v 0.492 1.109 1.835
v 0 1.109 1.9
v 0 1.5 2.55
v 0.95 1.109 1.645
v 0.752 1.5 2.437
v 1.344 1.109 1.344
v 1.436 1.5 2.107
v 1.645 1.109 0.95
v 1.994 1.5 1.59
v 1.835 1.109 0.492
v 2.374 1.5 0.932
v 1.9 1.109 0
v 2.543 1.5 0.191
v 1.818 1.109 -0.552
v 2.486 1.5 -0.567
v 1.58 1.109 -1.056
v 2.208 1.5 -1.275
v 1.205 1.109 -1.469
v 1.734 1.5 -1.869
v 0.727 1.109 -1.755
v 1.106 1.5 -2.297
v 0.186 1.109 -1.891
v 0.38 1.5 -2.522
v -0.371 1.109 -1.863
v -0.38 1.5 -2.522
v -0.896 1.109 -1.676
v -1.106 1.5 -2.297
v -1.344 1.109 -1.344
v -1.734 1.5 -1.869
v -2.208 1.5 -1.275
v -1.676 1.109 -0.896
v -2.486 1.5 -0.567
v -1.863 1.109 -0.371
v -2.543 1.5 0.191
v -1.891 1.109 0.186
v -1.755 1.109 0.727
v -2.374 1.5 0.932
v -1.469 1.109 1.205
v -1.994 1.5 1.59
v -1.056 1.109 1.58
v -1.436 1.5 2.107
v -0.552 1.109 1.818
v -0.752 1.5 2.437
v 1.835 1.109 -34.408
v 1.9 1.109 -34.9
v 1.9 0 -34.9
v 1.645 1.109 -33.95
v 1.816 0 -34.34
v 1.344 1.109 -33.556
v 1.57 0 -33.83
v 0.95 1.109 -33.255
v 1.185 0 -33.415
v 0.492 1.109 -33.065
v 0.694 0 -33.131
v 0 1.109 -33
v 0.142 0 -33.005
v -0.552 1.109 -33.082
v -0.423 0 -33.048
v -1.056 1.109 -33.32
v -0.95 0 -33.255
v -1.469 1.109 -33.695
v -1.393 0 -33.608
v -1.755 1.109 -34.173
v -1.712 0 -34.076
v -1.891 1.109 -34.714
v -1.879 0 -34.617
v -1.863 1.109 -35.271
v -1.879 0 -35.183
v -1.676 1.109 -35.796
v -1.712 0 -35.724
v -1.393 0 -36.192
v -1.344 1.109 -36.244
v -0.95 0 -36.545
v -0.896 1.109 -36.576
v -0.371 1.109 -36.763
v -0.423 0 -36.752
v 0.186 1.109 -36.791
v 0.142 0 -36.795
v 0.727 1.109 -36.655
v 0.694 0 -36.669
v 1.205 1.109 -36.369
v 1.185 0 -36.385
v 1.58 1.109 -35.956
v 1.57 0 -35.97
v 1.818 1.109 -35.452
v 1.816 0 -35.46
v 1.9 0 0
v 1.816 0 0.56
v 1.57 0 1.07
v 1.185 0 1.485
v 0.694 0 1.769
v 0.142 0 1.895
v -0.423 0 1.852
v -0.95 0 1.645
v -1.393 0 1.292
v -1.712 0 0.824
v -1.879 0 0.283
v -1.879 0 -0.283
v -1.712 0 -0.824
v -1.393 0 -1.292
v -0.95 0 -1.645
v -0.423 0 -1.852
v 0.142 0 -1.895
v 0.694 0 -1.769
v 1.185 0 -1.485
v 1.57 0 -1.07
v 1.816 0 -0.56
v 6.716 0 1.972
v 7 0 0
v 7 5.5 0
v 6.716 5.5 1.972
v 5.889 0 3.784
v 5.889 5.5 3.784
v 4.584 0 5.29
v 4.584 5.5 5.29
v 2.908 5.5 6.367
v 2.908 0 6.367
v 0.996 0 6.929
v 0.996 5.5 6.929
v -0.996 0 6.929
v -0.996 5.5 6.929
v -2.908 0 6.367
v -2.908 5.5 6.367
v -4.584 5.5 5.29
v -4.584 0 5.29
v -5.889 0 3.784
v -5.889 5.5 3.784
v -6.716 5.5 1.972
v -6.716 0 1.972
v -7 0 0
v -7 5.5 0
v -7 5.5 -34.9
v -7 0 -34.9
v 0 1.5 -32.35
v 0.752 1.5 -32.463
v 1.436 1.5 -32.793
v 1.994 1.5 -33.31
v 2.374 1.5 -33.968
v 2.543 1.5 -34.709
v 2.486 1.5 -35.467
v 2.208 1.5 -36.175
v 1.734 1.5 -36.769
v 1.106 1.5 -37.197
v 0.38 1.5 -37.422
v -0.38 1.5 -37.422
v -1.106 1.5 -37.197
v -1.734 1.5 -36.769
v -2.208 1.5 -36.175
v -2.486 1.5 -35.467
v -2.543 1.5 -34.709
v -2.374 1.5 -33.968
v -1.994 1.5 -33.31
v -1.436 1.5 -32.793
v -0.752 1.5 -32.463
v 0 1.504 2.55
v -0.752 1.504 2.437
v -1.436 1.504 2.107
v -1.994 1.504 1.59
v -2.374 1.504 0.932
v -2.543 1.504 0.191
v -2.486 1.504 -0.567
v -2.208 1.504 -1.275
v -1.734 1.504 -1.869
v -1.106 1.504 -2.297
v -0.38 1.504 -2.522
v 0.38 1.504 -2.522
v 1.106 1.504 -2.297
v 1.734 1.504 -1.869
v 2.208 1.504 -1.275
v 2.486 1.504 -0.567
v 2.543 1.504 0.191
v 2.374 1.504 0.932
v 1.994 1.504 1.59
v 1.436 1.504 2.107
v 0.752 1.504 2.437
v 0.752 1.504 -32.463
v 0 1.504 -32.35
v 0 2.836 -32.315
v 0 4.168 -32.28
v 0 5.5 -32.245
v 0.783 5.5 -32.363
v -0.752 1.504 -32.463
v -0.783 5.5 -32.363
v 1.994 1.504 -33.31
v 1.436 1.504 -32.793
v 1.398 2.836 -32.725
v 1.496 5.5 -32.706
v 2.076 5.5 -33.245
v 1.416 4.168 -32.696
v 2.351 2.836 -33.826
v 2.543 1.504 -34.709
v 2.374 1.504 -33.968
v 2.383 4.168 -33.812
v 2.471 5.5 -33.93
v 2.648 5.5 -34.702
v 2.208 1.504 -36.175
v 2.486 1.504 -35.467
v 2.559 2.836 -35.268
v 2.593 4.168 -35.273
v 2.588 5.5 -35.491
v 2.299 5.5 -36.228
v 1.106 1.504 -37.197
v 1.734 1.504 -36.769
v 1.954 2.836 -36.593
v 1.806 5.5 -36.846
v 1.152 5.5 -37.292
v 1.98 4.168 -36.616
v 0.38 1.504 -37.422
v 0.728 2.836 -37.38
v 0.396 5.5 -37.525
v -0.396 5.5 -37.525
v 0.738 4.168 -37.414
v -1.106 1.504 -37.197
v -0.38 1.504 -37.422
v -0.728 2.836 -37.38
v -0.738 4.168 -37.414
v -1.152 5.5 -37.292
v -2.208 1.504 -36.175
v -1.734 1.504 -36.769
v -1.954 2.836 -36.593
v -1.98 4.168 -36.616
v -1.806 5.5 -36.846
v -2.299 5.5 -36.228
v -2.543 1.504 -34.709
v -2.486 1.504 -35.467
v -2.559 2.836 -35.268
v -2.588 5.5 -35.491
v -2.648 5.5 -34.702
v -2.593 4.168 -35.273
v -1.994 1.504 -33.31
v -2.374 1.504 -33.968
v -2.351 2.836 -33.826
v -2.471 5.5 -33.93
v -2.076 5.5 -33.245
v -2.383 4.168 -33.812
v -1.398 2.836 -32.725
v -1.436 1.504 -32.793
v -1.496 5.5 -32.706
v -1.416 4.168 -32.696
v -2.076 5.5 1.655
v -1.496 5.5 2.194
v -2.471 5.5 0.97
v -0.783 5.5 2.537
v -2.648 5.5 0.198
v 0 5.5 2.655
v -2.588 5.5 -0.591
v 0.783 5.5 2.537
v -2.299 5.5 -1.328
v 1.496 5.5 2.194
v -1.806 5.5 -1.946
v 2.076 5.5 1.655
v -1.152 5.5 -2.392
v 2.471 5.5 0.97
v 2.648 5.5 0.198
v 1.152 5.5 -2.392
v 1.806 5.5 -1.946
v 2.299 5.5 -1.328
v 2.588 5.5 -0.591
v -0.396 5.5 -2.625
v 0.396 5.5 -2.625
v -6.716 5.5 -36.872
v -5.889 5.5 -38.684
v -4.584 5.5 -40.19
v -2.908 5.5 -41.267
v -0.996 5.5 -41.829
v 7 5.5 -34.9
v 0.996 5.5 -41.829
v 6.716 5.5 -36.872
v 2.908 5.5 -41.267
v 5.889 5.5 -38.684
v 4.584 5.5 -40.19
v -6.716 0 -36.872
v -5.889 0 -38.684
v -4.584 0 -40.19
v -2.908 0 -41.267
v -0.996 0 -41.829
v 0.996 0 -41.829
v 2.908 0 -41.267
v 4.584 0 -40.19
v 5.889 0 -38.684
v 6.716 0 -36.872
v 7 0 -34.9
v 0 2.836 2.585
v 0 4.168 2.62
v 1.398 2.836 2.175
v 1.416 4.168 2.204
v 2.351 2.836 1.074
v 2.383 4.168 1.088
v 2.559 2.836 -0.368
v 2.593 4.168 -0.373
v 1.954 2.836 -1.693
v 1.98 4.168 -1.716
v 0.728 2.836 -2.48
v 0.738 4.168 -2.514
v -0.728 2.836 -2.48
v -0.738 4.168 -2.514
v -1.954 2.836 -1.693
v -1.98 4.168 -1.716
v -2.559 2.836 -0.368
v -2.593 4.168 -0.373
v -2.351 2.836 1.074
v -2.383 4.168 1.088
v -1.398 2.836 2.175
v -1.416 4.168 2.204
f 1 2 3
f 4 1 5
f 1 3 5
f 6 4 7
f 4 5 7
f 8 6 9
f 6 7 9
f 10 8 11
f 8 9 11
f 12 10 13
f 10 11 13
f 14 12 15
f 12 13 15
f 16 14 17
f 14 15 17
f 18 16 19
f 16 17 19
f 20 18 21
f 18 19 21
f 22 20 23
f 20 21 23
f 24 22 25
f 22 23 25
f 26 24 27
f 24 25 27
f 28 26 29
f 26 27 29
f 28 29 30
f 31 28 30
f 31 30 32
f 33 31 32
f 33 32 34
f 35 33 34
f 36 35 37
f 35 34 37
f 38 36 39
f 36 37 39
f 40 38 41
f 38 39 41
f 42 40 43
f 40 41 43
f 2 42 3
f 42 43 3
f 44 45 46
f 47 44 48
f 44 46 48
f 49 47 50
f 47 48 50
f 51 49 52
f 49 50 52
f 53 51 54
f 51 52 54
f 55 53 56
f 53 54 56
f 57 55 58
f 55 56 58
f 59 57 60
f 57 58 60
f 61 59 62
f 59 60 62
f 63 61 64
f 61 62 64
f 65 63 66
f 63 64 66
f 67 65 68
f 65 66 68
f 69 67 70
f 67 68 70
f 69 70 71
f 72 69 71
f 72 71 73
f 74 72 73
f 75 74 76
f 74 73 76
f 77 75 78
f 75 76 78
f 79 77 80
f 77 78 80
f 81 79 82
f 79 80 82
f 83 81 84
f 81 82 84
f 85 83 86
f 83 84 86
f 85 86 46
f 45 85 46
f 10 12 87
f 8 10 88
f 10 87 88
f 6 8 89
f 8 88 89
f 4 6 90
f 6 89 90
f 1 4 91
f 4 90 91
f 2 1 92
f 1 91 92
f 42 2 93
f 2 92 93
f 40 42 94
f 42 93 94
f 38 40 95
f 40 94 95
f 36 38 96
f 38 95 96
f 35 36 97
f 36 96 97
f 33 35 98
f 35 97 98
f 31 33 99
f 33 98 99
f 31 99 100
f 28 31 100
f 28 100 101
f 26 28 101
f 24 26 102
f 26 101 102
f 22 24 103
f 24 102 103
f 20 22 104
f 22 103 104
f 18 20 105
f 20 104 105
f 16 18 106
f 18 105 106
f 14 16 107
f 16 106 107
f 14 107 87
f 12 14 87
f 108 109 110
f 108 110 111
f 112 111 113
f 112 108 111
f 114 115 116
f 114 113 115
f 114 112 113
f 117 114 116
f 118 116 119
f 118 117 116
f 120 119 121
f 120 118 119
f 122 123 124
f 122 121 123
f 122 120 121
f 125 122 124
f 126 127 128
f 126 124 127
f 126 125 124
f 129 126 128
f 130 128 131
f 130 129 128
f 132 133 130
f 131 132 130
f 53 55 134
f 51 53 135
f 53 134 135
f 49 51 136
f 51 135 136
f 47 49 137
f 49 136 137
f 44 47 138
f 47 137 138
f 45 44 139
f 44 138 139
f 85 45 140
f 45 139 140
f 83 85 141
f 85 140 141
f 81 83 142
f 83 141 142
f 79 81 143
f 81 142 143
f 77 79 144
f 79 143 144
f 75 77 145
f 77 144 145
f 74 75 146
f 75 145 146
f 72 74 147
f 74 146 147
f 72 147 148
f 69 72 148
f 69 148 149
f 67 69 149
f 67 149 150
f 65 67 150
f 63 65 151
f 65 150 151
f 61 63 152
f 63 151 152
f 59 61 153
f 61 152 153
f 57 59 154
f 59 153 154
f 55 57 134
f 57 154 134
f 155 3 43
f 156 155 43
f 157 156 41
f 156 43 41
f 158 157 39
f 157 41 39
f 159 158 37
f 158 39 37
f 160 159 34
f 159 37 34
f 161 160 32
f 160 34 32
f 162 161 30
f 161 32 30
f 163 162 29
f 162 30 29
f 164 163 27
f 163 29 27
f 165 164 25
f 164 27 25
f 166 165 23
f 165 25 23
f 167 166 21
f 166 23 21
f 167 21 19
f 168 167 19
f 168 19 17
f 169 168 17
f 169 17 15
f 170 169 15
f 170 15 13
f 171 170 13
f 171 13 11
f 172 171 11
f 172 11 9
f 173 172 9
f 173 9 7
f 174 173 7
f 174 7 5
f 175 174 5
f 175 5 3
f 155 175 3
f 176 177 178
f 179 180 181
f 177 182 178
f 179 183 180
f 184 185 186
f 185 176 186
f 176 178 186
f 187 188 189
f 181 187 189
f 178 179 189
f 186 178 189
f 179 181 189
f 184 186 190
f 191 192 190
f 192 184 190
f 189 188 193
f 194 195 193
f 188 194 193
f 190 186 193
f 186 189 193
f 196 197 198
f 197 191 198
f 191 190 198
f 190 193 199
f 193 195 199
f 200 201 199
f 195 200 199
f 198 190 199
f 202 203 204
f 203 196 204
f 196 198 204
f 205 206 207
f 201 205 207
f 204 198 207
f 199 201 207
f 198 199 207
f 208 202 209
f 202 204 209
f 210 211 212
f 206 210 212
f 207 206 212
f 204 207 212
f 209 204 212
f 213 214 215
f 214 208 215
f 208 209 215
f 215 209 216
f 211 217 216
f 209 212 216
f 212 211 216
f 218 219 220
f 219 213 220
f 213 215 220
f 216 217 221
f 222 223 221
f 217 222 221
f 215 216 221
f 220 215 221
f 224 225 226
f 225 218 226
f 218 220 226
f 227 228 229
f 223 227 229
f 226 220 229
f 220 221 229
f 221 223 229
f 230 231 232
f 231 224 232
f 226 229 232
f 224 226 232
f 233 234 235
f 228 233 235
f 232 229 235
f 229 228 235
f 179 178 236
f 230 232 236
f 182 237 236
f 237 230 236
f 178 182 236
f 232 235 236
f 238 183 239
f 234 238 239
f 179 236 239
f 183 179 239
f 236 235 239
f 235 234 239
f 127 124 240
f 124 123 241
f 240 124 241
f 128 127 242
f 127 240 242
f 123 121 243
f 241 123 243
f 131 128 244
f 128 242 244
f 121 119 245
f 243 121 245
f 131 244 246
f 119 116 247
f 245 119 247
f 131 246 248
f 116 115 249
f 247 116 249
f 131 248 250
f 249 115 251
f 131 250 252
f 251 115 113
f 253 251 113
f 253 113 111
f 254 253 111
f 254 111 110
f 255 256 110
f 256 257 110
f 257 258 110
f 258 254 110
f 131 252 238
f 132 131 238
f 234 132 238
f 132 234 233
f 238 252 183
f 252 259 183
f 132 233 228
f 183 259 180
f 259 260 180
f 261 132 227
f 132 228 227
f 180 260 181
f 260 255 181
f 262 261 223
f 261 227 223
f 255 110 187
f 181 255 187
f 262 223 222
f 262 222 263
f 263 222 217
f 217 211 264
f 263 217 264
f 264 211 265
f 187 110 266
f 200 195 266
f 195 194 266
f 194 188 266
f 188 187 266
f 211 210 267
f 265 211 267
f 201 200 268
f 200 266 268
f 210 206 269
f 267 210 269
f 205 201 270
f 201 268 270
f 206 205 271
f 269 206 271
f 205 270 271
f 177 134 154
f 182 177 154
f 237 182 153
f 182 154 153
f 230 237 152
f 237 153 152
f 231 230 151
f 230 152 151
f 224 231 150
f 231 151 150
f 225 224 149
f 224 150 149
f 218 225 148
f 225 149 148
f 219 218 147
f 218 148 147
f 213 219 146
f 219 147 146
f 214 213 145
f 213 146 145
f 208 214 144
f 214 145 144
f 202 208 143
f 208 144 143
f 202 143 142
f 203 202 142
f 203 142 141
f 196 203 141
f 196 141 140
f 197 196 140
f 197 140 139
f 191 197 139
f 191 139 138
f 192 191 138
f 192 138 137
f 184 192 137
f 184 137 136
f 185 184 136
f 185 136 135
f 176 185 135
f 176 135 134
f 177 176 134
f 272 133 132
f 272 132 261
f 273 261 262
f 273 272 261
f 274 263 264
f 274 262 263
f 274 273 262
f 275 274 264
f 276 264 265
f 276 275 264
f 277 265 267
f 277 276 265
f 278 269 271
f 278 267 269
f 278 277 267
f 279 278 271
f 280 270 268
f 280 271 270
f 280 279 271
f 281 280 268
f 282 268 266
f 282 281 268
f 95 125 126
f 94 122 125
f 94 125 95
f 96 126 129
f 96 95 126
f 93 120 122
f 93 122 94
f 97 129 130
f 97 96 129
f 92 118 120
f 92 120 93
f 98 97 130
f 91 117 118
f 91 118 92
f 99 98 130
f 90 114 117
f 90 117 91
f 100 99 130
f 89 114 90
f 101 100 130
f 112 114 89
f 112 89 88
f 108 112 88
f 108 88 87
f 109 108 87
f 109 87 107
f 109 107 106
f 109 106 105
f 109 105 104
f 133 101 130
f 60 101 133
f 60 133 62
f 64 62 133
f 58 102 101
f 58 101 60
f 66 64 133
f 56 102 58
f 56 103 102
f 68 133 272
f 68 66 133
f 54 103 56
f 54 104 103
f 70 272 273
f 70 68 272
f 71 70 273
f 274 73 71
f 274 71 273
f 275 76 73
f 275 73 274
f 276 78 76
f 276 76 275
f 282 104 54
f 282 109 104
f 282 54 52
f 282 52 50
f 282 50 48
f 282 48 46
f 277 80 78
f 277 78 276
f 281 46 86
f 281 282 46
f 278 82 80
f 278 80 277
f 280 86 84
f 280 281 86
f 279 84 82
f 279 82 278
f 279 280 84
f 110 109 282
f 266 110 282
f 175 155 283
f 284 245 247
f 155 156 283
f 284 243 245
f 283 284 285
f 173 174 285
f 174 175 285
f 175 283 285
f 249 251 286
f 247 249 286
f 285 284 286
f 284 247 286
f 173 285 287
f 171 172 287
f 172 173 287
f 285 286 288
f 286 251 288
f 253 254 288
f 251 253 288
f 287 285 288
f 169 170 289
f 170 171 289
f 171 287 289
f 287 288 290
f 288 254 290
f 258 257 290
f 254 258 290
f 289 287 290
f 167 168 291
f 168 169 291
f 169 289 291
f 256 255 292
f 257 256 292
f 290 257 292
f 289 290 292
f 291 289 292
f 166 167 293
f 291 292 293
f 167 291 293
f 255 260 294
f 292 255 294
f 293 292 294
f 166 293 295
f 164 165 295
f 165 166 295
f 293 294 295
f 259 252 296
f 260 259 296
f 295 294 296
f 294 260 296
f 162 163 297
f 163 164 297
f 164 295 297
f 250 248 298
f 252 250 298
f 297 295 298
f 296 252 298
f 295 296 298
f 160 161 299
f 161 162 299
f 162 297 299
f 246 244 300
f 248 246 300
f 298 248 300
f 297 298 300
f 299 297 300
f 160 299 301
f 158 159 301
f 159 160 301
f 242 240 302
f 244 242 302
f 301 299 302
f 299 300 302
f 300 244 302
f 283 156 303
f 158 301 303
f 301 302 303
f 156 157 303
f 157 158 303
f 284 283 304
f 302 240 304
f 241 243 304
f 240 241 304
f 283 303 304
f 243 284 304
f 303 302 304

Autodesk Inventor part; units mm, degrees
ref_plane "YZ Plane" through (0, 0, 0) normal (1, 0, 0) x (0, 1, 0)
ref_plane "XZ Plane" through (0, 0, 0) normal (0, 1, 0) x (-1, 0, 0)
ref_plane "XY Plane" through (0, 0, 0) normal (0, 0, 1) x (1, 0, 0)
sketch "Sketch1" plane through (0, 0, 0) normal (0, 1, 0) x (-1, 0, 0)
  line L0 (0, 0) -> (0, -34.9)
  line L1 (0, 0) -> (-4, 0) construction
  line L2 (0, -34.9) -> (-4, -34.9) construction
  line L3 (0, 0) -> (-5, 0)
  arc A0 (5, 0) -> (-5, 0) centre (0, 0) ccw
  line L4 (-5, 0) -> (-5, -34.9)
  arc A1 (-5, -34.9) -> (5, -34.9) centre (0, -34.9) ccw
  line L5 (5, -34.9) -> (5, 0)
  dimension "d11" = 34.9
  dimension "d12" = 5
  dimension "d13" = 90
  dimension "d14" = 34.9
extrude "Extrusion1" add sketch "Sketch1" along normal blind 5.5
sketch "Sketch2" plane through (0, 5.5, 0) normal (0, 1, 0) x (1, 0, 0)
  circle A0 centre (0, 0) radius 2.655
  line L0 (0, 0) -> (0, 34.9)
  circle A1 centre (0, 34.9) radius 2.655
  dimension "d7" = 5.31
  dimension "d8" = 34.9
  dimension "d9" = 5.31
sketch "Sketch3" plane through (0, 0, 0) normal (0, -1, 0) x (1, 0, 0)
  circle A0 centre (0, 0) radius 1.9
  line L0 (0, 0) -> (0, -34.9)
  circle A1 centre (0, -34.9) radius 1.9
  dimension "d15" = 3.8
  dimension "d16" = 34.9
  dimension "d17" = 3.8
extrude "Extrusion2" cut sketch "Sketch3" against normal blind 1.2
sketch "Sketch4" plane through (0, 1.2, -34.9) normal (0, -1, 0) x (1, 0, 0)
  circle A0 centre (0, 0) radius 1.9 projected
  circle A1 centre (0, 0) radius 1.9
  circle A2 centre (0, 34.9) radius 1.9
sketch "Sketch5" plane through (5, 0, 0) normal (1, 0, 0) x (0, 0, -1)
  line L0 (0, 0) -> (0, 5.5) projected
  line L1 (0, 0) -> (0, 5.5)
hole "Hole1" at (0, 5.5, 0) at (0, 5.5, -34.9) direction (0, -1, 0) diameter 5.1 depth 4 tip angle 118 countersink diameter 5.31 countersink angle 3.01
thicken "Thicken1" operation add thickness 2 both sides no extend neighbours yes toward (-0.9967573, 0, -0.0804666) faces at (-4.9838, 1.8333, -35.3023) (5, 1.8333, -23.2667) (-5, 1.8333, -11.6333) (-4.9838, 3.6667, 0.4023)
properties part number "Rod_constraint"
